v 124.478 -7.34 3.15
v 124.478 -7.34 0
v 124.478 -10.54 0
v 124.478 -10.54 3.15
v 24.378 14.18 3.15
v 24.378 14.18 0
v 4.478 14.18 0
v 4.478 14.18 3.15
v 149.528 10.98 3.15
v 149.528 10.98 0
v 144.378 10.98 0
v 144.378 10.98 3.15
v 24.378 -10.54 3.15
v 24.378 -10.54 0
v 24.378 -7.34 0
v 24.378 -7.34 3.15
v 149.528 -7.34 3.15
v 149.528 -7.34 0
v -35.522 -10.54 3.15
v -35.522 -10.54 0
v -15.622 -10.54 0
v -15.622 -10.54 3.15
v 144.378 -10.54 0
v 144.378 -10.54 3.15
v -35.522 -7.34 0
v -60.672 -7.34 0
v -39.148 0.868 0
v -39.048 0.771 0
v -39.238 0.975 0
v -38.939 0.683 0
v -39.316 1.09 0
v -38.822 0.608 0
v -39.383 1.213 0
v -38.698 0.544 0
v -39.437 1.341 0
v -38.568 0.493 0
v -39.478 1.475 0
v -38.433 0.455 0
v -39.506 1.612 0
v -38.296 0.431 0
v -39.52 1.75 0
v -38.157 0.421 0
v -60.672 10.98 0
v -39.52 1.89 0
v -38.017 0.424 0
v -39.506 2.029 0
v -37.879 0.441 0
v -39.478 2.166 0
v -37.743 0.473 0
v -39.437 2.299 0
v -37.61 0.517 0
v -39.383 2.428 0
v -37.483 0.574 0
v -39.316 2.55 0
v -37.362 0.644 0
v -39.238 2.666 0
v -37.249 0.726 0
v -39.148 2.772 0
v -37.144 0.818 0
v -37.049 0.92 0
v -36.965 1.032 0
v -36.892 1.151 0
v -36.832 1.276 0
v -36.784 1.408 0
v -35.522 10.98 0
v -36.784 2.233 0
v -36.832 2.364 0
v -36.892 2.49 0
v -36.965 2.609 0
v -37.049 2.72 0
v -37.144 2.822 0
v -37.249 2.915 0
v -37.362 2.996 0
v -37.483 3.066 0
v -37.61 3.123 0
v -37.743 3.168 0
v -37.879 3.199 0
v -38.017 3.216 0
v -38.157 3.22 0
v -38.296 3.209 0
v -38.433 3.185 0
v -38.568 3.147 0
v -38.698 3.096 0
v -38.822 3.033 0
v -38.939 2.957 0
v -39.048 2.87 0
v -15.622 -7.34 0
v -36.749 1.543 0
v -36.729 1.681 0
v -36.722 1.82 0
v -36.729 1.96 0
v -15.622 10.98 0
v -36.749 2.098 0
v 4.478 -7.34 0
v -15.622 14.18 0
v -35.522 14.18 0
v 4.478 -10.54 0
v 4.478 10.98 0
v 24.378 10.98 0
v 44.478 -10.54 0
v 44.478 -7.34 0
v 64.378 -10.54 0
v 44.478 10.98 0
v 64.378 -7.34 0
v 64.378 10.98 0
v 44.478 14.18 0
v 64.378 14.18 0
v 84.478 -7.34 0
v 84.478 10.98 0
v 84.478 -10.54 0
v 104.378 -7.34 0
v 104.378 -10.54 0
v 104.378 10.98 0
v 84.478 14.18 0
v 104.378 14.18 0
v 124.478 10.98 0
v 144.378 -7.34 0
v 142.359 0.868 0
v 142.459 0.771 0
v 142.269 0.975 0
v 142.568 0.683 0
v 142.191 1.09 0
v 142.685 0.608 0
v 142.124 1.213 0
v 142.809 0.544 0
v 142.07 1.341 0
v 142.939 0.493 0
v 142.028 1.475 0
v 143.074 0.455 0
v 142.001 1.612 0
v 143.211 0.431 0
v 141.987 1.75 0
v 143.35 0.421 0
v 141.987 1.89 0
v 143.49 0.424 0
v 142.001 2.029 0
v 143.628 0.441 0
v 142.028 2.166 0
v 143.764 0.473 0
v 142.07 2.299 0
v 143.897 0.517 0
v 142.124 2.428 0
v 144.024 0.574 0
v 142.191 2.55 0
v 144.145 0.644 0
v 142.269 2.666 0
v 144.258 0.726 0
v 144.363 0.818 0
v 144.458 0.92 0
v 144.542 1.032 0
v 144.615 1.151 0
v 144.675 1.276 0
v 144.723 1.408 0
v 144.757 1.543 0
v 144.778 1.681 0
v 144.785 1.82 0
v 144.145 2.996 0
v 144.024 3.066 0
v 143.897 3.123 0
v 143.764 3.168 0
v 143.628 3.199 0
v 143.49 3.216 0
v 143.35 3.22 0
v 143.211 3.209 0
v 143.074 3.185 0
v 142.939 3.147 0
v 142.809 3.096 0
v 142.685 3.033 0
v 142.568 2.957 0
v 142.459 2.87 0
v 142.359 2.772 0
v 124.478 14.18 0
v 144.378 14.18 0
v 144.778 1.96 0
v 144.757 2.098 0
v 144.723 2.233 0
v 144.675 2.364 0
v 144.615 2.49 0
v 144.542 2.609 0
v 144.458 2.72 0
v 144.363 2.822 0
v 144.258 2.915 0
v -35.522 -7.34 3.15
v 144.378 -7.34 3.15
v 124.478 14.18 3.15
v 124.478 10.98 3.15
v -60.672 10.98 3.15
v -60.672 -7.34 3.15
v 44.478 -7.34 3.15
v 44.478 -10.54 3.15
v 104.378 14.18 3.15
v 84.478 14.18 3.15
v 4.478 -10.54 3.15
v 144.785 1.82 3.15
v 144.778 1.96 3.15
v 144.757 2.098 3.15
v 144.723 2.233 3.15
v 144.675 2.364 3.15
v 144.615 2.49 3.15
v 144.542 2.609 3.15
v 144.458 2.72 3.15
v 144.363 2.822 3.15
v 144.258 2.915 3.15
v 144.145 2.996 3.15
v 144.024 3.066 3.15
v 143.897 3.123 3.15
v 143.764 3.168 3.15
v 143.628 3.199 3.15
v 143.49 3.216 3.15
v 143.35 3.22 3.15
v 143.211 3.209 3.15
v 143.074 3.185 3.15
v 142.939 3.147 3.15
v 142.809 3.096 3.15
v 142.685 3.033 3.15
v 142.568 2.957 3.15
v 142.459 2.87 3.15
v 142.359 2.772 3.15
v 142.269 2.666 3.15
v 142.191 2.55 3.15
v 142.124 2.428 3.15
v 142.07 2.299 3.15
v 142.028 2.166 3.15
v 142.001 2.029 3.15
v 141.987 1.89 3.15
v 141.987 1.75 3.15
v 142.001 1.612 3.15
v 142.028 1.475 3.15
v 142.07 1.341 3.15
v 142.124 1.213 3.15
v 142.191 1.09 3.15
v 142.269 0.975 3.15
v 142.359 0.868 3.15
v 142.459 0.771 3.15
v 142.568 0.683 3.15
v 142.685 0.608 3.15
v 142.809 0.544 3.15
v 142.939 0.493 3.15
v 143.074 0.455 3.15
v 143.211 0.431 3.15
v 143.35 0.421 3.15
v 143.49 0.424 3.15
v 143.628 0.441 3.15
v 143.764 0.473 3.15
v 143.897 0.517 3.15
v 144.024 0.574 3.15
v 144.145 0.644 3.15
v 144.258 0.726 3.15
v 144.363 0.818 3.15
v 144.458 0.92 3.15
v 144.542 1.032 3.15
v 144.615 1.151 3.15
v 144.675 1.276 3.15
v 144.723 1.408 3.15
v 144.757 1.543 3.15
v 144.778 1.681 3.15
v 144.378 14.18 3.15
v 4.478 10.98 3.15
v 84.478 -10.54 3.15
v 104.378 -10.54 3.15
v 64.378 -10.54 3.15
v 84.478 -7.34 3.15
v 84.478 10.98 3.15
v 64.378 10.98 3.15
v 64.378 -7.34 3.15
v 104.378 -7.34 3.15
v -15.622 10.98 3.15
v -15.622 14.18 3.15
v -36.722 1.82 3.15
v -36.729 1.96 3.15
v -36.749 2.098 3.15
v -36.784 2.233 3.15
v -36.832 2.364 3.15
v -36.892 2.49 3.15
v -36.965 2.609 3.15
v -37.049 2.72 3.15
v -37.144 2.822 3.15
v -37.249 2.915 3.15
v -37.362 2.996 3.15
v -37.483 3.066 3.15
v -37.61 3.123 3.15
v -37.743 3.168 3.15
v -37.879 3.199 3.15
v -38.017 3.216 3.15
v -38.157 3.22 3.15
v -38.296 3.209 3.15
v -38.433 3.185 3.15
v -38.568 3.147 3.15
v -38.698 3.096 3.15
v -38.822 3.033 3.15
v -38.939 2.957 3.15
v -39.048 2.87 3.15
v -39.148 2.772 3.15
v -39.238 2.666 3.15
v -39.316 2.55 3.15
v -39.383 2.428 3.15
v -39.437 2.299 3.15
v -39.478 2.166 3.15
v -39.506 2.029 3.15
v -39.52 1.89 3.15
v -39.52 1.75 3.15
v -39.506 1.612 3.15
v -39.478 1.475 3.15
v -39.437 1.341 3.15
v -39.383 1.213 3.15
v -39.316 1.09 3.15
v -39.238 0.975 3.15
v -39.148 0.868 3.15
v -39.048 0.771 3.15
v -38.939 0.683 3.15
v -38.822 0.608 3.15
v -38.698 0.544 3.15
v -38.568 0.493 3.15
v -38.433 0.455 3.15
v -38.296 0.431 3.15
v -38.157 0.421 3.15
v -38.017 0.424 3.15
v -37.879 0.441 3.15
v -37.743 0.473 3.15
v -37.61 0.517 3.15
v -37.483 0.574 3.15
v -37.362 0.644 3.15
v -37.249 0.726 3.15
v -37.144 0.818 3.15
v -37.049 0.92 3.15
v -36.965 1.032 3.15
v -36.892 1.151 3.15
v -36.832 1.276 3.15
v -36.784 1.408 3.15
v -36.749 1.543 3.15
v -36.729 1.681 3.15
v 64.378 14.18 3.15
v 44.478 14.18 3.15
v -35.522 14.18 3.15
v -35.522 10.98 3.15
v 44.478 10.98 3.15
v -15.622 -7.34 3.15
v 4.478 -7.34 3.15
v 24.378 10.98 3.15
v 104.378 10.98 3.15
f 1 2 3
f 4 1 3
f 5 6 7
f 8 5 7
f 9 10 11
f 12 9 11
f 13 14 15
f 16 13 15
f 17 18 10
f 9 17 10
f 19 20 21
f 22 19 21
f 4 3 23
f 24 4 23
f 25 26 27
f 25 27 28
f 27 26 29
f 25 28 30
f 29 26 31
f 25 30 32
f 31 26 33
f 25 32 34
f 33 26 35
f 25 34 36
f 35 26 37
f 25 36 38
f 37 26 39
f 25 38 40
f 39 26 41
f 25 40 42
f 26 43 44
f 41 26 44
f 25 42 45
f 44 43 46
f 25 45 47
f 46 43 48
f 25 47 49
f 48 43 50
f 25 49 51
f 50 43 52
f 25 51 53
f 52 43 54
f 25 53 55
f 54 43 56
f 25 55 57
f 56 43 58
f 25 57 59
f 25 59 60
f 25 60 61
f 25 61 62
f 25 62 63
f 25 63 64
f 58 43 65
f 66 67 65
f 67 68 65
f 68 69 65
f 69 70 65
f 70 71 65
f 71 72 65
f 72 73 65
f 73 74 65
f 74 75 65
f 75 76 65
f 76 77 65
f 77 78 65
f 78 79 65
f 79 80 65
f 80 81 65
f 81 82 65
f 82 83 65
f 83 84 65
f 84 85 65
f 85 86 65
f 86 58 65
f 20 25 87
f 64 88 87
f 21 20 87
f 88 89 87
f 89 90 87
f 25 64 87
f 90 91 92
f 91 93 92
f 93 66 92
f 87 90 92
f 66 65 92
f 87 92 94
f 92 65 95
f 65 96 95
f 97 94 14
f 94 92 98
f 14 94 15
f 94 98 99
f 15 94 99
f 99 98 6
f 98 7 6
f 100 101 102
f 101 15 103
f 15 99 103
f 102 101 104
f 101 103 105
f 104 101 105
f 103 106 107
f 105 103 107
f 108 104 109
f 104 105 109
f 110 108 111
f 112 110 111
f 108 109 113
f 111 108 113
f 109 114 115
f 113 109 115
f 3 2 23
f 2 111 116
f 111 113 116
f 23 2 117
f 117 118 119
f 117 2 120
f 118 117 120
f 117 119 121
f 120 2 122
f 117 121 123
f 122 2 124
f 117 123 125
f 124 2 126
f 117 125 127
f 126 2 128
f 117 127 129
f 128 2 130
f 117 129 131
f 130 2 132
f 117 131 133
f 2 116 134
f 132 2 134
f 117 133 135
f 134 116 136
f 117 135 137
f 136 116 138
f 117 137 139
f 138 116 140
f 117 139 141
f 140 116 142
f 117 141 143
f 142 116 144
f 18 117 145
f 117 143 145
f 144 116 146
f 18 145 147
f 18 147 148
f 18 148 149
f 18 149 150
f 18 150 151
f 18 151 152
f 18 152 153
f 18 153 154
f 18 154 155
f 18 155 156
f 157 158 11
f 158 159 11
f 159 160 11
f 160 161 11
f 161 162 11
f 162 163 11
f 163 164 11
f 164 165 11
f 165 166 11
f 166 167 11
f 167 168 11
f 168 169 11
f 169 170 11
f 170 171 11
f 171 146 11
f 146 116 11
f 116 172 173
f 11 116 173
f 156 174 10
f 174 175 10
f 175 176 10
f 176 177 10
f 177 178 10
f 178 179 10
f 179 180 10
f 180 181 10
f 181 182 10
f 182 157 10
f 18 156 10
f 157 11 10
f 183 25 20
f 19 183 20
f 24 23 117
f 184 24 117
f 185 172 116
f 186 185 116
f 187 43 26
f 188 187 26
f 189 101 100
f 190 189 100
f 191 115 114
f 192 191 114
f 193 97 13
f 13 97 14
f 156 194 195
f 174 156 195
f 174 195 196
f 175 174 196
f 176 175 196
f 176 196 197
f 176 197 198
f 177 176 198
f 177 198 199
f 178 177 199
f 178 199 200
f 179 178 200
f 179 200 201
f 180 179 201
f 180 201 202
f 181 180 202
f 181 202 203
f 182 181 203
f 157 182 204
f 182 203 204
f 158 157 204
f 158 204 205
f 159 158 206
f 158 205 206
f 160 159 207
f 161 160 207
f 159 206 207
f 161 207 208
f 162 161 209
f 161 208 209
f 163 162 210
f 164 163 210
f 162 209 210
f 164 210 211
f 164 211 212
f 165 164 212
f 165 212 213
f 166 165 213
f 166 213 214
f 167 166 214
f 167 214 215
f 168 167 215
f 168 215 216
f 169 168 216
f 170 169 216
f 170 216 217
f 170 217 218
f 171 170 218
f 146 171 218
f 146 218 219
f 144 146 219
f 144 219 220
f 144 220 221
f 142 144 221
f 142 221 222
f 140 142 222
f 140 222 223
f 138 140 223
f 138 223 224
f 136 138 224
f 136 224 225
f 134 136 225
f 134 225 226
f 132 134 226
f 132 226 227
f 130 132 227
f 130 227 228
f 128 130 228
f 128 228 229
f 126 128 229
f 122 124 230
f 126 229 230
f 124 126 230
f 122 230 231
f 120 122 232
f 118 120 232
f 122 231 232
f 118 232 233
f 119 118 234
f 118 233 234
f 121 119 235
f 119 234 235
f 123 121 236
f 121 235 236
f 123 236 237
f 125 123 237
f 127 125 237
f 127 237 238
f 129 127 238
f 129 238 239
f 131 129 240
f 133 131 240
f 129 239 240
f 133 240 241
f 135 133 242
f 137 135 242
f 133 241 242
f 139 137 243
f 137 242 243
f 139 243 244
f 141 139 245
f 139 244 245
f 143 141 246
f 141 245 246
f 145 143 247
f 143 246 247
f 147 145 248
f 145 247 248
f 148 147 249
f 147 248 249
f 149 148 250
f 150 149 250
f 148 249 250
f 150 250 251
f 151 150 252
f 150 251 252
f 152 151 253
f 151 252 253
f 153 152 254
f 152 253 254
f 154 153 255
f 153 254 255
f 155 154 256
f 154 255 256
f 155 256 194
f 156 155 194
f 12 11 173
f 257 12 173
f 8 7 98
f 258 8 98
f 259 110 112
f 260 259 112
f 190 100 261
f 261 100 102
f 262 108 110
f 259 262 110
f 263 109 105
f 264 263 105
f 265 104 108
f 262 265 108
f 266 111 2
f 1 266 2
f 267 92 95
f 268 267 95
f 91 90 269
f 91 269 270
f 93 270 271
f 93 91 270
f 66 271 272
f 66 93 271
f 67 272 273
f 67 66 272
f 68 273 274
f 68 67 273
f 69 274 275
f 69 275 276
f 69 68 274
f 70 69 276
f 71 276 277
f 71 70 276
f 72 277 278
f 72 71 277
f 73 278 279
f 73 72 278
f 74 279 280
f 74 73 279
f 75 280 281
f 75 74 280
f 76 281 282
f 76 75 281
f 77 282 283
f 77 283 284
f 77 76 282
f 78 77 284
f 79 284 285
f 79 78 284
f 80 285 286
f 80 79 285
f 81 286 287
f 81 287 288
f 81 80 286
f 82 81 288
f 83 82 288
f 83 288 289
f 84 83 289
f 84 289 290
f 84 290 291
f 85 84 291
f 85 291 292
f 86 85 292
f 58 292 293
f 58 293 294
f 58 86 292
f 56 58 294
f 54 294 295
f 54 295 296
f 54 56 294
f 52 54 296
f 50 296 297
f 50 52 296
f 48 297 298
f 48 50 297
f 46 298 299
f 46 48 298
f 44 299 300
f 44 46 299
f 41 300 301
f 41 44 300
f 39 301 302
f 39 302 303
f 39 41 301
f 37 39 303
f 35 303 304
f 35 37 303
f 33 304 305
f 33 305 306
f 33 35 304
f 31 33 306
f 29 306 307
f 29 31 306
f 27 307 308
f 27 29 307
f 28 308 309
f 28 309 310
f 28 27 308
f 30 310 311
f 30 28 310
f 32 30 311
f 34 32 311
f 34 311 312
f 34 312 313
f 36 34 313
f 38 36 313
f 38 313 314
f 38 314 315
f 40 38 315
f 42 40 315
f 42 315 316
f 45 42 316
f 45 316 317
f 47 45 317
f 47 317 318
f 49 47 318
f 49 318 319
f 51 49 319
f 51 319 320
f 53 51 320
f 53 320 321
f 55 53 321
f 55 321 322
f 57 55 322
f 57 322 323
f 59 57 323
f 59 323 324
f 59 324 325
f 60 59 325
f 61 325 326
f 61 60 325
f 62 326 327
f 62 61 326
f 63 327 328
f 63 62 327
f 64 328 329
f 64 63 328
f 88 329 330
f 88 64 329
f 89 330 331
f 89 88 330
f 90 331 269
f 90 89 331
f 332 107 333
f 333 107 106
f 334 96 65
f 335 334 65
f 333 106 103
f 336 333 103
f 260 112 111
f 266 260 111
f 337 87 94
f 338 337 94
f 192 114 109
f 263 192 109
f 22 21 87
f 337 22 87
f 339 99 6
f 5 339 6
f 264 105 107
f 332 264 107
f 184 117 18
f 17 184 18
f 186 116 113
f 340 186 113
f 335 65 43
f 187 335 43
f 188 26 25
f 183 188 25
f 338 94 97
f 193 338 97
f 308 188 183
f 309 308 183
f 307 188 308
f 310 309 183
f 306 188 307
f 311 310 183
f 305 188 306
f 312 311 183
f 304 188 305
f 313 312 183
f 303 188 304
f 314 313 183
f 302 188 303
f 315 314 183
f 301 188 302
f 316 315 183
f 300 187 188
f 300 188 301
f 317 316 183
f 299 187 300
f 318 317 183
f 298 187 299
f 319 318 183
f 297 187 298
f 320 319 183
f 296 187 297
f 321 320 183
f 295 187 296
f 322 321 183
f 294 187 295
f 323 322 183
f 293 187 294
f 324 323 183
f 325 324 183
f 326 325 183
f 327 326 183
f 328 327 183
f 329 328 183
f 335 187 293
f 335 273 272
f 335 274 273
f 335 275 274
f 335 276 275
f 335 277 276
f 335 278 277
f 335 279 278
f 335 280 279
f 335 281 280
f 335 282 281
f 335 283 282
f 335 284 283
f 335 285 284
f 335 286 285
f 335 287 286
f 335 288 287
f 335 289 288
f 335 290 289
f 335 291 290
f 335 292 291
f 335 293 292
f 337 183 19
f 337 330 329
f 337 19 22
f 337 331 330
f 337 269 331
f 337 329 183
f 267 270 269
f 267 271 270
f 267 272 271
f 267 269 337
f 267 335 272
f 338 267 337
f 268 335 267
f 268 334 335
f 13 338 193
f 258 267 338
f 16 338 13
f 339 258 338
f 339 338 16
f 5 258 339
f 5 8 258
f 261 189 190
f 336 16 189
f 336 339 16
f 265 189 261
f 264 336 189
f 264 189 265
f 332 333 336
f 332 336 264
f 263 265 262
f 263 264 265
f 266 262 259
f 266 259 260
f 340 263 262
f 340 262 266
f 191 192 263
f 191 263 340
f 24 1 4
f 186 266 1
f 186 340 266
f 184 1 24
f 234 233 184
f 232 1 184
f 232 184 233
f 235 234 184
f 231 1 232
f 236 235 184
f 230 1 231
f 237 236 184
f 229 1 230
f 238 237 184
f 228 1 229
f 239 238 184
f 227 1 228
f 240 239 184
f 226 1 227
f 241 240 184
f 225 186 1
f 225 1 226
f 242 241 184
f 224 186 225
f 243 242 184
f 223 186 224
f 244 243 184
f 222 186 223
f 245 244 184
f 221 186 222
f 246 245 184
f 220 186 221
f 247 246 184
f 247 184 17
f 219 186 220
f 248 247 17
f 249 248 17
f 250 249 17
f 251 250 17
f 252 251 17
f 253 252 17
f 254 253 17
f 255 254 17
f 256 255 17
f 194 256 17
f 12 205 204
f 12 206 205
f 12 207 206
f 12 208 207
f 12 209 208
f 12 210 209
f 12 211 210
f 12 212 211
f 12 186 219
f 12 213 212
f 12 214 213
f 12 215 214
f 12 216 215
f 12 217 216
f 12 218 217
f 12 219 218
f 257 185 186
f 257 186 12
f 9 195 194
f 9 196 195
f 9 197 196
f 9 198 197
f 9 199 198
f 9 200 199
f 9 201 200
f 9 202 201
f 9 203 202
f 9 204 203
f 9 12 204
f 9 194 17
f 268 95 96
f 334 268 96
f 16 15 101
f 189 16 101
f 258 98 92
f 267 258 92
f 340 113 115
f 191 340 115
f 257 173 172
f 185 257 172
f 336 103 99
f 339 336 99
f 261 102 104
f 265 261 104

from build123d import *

# Parameters (mm, degrees)
SKETCH1_R           = 1.4
BOSS_EXTRUDE1_DEPTH = 3.15
SKETCH2_R           = 1.4
CUT_EXTRUDE1_DEPTH  = 10


with BuildPart() as part:
    # Sketch1 → Boss-Extrude1 (new body)
    with BuildSketch(Plane.XY):
        Polygon((-60.67170061, 10.980201327), (-60.67170061, -7.339798673), (-35.52170061, -7.339798673), (-35.52170061, -7.389798673), (-35.52170061, -10.539798673), (-15.62170061, -10.539798673), (-15.62170061, -7.339798673), (4.47829939, -7.339798673), (4.47829939, -10.539798673), (24.37829939, -10.539798673), (24.37829939, -7.339798673), (44.47829939, -7.339798673), (44.47829939, -10.539798673), (64.37829939, -10.539798673), (64.37829939, -7.339798673), (84.47829939, -7.339798673), (84.47829939, -10.539798673), (104.37829939, -10.539798673), (104.37829939, -7.339798673), (124.47829939, -7.339798673), (124.47829939, -10.539798673), (144.37829939, -10.539798673), (144.37829939, -7.389798673), (144.37829939, -7.339798673), (144.462459505, -7.339798673), (149.52829939, -7.339798673), (149.52829939, 10.980201327), (144.462459505, 10.980201327), (144.37829939, 10.980201327), (144.37829939, 11.030201327), (144.37829939, 14.180201327), (124.47829939, 14.180201327), (124.47829939, 10.980201327), (104.37829939, 10.980201327), (104.37829939, 14.180201327), (84.47829939, 14.180201327), (84.47829939, 10.980201327), (64.37829939, 10.980201327), (64.37829939, 14.180201327), (44.47829939, 14.180201327), (44.47829939, 10.980201327), (24.37829939, 10.980201327), (24.37829939, 14.180201327), (4.47829939, 14.180201327), (4.47829939, 10.980201327), (-15.62170061, 10.980201327), (-15.62170061, 14.180201327), (-35.52170061, 14.180201327), (-35.52170061, 10.980201327), (-35.57170061, 10.980201327), align=None)
        with Locations((-38.12170061, 1.820201327)):
            Circle(SKETCH1_R, mode=Mode.SUBTRACT)
    extrude(amount=BOSS_EXTRUDE1_DEPTH)

    # Sketch2 → Cut-Extrude1 (cut)
    with BuildSketch(Plane.XY.offset(3.15)):
        with Locations((143.385201149, 1.820201327)):
            Circle(SKETCH2_R)
    extrude(amount=-CUT_EXTRUDE1_DEPTH, mode=Mode.SUBTRACT)


solid = part.part
